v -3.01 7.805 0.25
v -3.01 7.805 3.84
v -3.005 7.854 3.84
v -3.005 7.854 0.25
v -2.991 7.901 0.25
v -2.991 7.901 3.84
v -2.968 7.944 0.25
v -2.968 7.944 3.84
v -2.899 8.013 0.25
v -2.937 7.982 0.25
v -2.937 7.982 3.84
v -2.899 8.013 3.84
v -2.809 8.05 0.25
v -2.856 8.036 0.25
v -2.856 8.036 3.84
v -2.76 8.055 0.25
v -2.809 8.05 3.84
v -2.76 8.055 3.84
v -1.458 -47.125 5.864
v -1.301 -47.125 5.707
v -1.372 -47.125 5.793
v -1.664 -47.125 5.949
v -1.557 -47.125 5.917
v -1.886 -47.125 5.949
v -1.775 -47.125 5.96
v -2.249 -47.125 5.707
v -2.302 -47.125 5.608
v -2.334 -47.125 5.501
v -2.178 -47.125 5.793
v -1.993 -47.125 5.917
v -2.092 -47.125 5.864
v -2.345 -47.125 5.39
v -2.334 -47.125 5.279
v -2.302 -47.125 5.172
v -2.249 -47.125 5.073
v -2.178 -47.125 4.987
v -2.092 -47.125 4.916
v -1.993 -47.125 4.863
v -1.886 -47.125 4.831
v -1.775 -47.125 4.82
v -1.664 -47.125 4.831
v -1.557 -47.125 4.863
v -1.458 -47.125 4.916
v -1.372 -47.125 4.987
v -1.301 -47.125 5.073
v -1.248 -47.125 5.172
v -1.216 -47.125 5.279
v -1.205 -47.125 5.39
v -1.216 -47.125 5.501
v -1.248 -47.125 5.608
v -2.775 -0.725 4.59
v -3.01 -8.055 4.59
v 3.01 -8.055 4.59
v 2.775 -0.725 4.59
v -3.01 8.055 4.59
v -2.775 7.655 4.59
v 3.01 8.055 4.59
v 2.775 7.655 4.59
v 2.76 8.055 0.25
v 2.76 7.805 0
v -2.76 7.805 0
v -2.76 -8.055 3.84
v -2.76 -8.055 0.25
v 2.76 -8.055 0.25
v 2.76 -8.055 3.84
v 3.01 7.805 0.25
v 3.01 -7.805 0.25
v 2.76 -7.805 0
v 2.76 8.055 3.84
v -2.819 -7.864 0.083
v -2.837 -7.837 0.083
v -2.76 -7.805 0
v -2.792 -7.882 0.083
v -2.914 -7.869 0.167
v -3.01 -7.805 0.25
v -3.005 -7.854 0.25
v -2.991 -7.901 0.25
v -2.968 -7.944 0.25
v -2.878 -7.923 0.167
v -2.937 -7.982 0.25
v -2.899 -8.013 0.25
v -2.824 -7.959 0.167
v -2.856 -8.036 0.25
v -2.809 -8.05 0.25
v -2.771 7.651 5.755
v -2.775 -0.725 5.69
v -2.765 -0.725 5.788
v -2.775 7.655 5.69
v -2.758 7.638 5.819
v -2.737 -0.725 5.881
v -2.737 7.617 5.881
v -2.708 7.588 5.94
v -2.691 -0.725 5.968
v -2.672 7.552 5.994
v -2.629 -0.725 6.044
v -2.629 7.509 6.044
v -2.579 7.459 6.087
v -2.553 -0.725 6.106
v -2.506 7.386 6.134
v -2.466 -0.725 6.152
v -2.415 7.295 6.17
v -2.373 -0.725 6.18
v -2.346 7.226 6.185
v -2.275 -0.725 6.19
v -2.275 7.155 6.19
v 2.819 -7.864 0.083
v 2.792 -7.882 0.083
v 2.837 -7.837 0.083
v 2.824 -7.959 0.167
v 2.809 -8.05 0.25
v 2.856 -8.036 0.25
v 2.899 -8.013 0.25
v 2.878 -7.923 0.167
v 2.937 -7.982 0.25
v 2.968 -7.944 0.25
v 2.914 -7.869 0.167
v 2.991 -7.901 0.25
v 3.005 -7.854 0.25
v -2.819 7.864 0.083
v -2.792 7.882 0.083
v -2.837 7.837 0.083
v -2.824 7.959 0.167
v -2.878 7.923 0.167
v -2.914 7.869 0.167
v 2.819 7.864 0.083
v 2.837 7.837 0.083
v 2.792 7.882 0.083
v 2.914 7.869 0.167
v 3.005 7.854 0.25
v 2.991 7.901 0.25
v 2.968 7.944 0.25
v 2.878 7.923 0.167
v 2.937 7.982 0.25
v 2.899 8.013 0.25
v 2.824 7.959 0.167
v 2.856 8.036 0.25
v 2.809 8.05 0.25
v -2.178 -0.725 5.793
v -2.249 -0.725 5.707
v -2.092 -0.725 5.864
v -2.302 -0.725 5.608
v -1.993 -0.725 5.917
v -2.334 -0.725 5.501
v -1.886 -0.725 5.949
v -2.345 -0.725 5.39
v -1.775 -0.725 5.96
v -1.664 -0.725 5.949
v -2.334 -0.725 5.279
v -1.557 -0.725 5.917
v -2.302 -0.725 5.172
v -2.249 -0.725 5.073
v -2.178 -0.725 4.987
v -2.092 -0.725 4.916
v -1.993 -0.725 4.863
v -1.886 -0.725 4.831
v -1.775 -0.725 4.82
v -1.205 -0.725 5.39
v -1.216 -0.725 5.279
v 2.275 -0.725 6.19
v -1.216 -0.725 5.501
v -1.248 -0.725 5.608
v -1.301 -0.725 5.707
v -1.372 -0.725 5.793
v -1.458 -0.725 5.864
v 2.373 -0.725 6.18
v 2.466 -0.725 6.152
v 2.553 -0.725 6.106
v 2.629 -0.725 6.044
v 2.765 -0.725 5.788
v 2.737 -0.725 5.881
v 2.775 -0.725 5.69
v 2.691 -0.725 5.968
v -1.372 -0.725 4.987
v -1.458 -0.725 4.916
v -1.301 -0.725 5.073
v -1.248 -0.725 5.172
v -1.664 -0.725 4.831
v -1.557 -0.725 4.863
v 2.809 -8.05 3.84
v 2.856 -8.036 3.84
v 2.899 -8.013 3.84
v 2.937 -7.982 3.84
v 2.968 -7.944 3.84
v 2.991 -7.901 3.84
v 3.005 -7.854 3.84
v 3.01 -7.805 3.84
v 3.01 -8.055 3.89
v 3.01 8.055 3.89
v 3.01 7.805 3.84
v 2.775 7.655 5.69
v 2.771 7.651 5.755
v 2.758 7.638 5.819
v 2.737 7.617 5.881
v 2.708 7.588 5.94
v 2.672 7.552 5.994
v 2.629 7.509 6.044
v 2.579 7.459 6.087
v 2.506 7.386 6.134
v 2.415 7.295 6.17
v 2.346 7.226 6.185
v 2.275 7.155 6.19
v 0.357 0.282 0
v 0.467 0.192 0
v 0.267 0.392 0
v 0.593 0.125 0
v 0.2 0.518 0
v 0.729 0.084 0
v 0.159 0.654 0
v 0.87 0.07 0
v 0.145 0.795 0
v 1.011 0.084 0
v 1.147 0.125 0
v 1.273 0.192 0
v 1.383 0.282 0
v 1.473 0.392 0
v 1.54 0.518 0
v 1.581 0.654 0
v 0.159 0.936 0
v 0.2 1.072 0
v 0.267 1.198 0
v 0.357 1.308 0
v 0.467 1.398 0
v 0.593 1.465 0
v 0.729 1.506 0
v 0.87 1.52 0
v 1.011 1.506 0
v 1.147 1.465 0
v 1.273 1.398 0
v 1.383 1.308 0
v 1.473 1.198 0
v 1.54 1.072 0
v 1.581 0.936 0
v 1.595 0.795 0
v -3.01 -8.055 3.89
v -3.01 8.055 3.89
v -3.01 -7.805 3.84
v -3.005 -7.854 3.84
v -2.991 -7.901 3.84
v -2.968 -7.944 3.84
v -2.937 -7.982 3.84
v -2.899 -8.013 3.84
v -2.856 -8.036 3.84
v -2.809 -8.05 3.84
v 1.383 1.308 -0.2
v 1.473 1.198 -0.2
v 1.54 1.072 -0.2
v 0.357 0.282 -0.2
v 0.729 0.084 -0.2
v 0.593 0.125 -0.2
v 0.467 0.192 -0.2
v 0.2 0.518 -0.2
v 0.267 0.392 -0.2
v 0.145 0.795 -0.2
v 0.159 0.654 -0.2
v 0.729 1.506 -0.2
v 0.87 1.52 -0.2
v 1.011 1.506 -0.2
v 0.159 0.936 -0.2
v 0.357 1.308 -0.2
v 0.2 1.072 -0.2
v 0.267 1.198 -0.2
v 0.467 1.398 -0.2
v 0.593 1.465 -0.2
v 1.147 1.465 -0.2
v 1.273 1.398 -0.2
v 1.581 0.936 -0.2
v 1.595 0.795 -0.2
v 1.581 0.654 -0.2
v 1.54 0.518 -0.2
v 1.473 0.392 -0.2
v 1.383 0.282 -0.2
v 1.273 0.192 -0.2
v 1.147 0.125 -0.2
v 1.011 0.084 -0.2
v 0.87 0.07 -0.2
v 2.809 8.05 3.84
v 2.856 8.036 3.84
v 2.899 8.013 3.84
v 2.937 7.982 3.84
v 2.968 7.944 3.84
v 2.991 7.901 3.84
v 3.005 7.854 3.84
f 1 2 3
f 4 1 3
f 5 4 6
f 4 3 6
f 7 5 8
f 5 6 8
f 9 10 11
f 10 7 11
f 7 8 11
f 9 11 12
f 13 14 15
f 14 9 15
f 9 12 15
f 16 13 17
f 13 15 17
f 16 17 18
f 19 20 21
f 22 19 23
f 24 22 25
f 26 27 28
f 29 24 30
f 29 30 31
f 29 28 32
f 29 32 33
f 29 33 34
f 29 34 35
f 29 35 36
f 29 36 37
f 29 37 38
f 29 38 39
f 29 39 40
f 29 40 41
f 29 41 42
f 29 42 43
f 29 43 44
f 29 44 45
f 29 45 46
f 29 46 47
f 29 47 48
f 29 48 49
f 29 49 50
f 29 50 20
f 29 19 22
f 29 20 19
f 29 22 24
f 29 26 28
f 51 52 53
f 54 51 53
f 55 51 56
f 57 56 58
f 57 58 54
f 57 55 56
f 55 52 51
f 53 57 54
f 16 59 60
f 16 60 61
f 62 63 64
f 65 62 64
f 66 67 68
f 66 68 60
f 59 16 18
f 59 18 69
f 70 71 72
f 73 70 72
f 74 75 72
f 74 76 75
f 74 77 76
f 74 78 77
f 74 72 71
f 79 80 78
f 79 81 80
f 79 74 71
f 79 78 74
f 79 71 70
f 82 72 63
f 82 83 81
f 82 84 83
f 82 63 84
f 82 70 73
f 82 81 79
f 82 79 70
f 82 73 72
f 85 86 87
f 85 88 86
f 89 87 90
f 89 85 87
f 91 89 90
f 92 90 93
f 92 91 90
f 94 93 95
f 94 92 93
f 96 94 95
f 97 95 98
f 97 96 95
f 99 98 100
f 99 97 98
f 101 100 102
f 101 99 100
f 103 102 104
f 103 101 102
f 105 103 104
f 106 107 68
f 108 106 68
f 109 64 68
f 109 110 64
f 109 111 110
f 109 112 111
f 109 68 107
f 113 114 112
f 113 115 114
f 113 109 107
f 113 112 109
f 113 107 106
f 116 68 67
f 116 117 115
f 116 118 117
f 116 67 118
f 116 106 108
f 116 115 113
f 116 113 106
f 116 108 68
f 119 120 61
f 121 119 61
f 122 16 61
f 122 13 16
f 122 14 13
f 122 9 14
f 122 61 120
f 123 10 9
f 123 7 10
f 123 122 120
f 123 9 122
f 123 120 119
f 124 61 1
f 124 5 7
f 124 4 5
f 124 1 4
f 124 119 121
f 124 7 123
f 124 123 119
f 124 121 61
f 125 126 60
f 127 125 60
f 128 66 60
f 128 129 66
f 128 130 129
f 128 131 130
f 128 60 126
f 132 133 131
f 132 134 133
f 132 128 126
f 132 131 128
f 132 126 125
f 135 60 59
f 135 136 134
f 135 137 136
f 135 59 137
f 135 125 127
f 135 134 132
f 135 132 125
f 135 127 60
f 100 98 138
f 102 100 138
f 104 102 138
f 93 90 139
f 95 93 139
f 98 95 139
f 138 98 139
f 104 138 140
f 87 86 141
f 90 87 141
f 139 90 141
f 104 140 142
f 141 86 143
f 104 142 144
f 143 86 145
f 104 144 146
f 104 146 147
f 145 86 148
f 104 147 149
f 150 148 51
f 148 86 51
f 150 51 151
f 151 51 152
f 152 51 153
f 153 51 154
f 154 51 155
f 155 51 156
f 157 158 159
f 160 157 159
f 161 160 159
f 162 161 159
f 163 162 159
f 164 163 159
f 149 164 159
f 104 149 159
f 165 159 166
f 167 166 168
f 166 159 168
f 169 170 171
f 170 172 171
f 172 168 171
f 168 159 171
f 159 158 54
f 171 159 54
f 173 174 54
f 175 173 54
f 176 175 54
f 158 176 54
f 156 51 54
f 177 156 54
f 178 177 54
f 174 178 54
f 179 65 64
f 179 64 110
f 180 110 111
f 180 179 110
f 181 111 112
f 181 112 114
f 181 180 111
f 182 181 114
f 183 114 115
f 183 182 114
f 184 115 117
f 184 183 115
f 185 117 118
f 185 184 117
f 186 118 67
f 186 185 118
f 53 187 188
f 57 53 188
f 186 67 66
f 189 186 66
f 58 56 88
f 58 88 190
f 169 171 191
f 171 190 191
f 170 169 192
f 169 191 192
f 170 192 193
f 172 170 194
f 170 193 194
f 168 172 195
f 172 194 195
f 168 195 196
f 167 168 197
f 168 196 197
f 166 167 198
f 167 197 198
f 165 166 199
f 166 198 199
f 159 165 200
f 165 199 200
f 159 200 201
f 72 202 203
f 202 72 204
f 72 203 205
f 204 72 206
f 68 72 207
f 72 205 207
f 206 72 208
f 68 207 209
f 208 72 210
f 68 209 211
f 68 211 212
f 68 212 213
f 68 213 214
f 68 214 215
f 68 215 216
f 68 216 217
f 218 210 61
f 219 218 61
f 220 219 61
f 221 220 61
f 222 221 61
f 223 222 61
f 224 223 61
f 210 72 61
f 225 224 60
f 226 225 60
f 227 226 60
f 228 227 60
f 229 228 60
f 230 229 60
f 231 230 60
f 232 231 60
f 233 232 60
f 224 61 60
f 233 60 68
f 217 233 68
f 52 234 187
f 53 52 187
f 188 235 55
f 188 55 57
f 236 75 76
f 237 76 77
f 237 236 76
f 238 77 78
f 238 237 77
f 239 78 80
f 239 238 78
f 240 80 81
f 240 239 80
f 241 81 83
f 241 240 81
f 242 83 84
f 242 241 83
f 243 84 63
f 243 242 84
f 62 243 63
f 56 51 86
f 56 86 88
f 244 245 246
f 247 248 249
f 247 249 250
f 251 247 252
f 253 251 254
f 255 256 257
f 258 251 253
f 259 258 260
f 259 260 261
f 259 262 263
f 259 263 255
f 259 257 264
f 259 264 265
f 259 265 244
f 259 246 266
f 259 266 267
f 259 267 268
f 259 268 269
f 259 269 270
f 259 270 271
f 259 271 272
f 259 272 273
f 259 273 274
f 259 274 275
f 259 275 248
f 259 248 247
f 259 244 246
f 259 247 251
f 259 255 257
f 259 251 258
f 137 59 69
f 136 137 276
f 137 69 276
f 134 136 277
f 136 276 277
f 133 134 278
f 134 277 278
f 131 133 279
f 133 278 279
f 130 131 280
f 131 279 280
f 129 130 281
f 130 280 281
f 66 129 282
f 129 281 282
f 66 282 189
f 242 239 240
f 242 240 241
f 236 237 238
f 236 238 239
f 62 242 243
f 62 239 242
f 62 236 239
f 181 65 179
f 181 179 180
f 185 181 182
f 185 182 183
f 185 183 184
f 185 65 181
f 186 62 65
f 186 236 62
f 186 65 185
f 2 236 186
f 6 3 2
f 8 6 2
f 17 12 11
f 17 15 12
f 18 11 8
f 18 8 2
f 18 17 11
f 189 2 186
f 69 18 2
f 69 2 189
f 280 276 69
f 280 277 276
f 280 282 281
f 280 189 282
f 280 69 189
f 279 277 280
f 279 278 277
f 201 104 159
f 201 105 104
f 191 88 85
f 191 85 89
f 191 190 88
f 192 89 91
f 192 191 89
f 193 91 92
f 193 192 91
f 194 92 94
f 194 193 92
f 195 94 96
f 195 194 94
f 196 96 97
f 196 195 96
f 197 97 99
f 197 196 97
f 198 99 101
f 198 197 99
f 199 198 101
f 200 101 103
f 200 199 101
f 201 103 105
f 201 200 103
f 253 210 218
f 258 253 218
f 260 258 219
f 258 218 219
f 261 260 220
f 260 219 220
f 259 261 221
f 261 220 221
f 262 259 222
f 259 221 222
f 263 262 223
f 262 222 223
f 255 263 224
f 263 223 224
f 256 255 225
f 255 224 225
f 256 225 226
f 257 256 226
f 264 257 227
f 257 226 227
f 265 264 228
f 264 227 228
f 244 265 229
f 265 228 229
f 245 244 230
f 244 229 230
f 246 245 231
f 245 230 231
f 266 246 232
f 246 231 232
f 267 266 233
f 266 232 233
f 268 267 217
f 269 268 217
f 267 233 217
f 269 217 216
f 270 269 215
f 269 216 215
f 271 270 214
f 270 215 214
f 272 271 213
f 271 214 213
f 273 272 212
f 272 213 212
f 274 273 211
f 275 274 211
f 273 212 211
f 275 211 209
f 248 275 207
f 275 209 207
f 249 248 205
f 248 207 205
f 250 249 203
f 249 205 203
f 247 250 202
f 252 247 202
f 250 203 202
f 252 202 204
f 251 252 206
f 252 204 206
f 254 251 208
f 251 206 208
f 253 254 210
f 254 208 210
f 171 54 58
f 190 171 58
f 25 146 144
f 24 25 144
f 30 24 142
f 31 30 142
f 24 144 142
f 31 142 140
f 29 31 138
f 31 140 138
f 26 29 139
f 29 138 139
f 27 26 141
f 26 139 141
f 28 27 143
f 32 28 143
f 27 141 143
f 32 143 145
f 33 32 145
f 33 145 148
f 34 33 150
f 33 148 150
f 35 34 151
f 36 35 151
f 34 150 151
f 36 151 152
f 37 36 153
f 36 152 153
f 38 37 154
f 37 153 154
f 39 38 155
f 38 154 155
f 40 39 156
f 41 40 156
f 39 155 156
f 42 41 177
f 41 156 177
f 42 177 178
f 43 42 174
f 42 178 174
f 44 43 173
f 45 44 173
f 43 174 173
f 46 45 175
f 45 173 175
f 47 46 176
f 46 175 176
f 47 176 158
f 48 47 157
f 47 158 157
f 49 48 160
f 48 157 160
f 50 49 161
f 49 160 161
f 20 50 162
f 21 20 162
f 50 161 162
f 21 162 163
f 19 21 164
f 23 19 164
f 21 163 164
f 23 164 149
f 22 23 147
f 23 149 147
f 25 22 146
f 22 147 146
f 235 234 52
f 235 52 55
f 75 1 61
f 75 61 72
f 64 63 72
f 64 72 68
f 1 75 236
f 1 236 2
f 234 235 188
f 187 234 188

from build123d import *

# Parameters (mm, degrees)
SKETCH_1_W      = 6.02
SKETCH_1_H      = 16.11
EXTRUDE_1_DEPTH = 3.84
SKETCH_2_R      = 0.725
EXTRUDE_2_DEPTH = 0.2
SKETCH_3_W      = 6.02
SKETCH_3_H      = 16.11
EXTRUDE_3_DEPTH = 0.7
SKETCH_4_W      = 5.55
SKETCH_4_H      = 8.38
EXTRUDE_4_DEPTH = 1.6
SKETCH_5_R      = 0.57
EXTRUDE_5_DEPTH = 46.4
FILLET_1_R      = 0.5
FILLET_2_R      = 0.25
CHAMFER_1_SIZE  = 0.25


with BuildPart() as part:
    # Эскиз1 → Бобышка-Вытянуть1 (new body)
    with BuildSketch(Plane.XY):
        Rectangle(SKETCH_1_W, SKETCH_1_H)
    extrude(amount=EXTRUDE_1_DEPTH)

    # Эскиз2 → Бобышка-Вытянуть2 (add)
    with BuildSketch(Plane(origin=(0, 0, 0), x_dir=(-1, 0, 0), z_dir=(0, 0, -1))):
        with Locations((-0.87, 0.795)):
            Circle(SKETCH_2_R)
    extrude(amount=EXTRUDE_2_DEPTH)

    # Скругление2
    fillet_2_edges = [part.edges().sort_by_distance(p)[0] for p in [
        (3.01, -8.055, 1.92),
        (-3.01, -8.055, 1.92),
        (-3.01, 8.055, 1.92),
        (3.01, 8.055, 1.92),
    ]]
    fillet(fillet_2_edges, radius=FILLET_2_R)

    # Фаска1
    chamfer_1_edges = [part.edges().sort_by_distance(p)[0] for p in [
        (0, -8.055, 0),
        (3.01, 0, 0),
        (-3.01, 0, 0),
        (0, 8.055, 0),
        (-2.936776695, 7.981776695, 0),
        (2.936776695, 7.981776695, 0),
        (2.936776695, -7.981776695, 0),
        (-2.936776695, -7.981776695, 0),
    ]]
    chamfer(chamfer_1_edges, length=CHAMFER_1_SIZE)


with BuildPart() as body_2:
    # Эскиз3 → Бобышка-Вытянуть3 (new body)
    with BuildSketch(Plane.XY.offset(3.89)):
        Rectangle(SKETCH_3_W, SKETCH_3_H)
    extrude(amount=EXTRUDE_3_DEPTH)

    # Эскиз4 → Бобышка-Вытянуть4 (add)
    with BuildSketch(Plane.XY.offset(4.59)):
        with Locations((0, 3.465)):
            Rectangle(SKETCH_4_W, SKETCH_4_H)
    extrude(amount=EXTRUDE_4_DEPTH)

    # Эскиз5 → Бобышка-Вытянуть5 (add)
    with BuildSketch(Plane.XZ.offset(0.725)):
        with Locations(Location((-1.775, 5.39, 0), (0, 0, 90))):
            Circle(SKETCH_5_R)
    extrude(amount=EXTRUDE_5_DEPTH)

    # Скругление1
    fillet_1_edges = [body_2.edges().sort_by_distance(p)[0] for p in [
        (2.775, 3.465, 6.19),
        (0, 7.655, 6.19),
        (-2.775, 3.465, 6.19),
    ]]
    fillet(fillet_1_edges, radius=FILLET_1_R)


solid = Compound([part.part, body_2.part])
